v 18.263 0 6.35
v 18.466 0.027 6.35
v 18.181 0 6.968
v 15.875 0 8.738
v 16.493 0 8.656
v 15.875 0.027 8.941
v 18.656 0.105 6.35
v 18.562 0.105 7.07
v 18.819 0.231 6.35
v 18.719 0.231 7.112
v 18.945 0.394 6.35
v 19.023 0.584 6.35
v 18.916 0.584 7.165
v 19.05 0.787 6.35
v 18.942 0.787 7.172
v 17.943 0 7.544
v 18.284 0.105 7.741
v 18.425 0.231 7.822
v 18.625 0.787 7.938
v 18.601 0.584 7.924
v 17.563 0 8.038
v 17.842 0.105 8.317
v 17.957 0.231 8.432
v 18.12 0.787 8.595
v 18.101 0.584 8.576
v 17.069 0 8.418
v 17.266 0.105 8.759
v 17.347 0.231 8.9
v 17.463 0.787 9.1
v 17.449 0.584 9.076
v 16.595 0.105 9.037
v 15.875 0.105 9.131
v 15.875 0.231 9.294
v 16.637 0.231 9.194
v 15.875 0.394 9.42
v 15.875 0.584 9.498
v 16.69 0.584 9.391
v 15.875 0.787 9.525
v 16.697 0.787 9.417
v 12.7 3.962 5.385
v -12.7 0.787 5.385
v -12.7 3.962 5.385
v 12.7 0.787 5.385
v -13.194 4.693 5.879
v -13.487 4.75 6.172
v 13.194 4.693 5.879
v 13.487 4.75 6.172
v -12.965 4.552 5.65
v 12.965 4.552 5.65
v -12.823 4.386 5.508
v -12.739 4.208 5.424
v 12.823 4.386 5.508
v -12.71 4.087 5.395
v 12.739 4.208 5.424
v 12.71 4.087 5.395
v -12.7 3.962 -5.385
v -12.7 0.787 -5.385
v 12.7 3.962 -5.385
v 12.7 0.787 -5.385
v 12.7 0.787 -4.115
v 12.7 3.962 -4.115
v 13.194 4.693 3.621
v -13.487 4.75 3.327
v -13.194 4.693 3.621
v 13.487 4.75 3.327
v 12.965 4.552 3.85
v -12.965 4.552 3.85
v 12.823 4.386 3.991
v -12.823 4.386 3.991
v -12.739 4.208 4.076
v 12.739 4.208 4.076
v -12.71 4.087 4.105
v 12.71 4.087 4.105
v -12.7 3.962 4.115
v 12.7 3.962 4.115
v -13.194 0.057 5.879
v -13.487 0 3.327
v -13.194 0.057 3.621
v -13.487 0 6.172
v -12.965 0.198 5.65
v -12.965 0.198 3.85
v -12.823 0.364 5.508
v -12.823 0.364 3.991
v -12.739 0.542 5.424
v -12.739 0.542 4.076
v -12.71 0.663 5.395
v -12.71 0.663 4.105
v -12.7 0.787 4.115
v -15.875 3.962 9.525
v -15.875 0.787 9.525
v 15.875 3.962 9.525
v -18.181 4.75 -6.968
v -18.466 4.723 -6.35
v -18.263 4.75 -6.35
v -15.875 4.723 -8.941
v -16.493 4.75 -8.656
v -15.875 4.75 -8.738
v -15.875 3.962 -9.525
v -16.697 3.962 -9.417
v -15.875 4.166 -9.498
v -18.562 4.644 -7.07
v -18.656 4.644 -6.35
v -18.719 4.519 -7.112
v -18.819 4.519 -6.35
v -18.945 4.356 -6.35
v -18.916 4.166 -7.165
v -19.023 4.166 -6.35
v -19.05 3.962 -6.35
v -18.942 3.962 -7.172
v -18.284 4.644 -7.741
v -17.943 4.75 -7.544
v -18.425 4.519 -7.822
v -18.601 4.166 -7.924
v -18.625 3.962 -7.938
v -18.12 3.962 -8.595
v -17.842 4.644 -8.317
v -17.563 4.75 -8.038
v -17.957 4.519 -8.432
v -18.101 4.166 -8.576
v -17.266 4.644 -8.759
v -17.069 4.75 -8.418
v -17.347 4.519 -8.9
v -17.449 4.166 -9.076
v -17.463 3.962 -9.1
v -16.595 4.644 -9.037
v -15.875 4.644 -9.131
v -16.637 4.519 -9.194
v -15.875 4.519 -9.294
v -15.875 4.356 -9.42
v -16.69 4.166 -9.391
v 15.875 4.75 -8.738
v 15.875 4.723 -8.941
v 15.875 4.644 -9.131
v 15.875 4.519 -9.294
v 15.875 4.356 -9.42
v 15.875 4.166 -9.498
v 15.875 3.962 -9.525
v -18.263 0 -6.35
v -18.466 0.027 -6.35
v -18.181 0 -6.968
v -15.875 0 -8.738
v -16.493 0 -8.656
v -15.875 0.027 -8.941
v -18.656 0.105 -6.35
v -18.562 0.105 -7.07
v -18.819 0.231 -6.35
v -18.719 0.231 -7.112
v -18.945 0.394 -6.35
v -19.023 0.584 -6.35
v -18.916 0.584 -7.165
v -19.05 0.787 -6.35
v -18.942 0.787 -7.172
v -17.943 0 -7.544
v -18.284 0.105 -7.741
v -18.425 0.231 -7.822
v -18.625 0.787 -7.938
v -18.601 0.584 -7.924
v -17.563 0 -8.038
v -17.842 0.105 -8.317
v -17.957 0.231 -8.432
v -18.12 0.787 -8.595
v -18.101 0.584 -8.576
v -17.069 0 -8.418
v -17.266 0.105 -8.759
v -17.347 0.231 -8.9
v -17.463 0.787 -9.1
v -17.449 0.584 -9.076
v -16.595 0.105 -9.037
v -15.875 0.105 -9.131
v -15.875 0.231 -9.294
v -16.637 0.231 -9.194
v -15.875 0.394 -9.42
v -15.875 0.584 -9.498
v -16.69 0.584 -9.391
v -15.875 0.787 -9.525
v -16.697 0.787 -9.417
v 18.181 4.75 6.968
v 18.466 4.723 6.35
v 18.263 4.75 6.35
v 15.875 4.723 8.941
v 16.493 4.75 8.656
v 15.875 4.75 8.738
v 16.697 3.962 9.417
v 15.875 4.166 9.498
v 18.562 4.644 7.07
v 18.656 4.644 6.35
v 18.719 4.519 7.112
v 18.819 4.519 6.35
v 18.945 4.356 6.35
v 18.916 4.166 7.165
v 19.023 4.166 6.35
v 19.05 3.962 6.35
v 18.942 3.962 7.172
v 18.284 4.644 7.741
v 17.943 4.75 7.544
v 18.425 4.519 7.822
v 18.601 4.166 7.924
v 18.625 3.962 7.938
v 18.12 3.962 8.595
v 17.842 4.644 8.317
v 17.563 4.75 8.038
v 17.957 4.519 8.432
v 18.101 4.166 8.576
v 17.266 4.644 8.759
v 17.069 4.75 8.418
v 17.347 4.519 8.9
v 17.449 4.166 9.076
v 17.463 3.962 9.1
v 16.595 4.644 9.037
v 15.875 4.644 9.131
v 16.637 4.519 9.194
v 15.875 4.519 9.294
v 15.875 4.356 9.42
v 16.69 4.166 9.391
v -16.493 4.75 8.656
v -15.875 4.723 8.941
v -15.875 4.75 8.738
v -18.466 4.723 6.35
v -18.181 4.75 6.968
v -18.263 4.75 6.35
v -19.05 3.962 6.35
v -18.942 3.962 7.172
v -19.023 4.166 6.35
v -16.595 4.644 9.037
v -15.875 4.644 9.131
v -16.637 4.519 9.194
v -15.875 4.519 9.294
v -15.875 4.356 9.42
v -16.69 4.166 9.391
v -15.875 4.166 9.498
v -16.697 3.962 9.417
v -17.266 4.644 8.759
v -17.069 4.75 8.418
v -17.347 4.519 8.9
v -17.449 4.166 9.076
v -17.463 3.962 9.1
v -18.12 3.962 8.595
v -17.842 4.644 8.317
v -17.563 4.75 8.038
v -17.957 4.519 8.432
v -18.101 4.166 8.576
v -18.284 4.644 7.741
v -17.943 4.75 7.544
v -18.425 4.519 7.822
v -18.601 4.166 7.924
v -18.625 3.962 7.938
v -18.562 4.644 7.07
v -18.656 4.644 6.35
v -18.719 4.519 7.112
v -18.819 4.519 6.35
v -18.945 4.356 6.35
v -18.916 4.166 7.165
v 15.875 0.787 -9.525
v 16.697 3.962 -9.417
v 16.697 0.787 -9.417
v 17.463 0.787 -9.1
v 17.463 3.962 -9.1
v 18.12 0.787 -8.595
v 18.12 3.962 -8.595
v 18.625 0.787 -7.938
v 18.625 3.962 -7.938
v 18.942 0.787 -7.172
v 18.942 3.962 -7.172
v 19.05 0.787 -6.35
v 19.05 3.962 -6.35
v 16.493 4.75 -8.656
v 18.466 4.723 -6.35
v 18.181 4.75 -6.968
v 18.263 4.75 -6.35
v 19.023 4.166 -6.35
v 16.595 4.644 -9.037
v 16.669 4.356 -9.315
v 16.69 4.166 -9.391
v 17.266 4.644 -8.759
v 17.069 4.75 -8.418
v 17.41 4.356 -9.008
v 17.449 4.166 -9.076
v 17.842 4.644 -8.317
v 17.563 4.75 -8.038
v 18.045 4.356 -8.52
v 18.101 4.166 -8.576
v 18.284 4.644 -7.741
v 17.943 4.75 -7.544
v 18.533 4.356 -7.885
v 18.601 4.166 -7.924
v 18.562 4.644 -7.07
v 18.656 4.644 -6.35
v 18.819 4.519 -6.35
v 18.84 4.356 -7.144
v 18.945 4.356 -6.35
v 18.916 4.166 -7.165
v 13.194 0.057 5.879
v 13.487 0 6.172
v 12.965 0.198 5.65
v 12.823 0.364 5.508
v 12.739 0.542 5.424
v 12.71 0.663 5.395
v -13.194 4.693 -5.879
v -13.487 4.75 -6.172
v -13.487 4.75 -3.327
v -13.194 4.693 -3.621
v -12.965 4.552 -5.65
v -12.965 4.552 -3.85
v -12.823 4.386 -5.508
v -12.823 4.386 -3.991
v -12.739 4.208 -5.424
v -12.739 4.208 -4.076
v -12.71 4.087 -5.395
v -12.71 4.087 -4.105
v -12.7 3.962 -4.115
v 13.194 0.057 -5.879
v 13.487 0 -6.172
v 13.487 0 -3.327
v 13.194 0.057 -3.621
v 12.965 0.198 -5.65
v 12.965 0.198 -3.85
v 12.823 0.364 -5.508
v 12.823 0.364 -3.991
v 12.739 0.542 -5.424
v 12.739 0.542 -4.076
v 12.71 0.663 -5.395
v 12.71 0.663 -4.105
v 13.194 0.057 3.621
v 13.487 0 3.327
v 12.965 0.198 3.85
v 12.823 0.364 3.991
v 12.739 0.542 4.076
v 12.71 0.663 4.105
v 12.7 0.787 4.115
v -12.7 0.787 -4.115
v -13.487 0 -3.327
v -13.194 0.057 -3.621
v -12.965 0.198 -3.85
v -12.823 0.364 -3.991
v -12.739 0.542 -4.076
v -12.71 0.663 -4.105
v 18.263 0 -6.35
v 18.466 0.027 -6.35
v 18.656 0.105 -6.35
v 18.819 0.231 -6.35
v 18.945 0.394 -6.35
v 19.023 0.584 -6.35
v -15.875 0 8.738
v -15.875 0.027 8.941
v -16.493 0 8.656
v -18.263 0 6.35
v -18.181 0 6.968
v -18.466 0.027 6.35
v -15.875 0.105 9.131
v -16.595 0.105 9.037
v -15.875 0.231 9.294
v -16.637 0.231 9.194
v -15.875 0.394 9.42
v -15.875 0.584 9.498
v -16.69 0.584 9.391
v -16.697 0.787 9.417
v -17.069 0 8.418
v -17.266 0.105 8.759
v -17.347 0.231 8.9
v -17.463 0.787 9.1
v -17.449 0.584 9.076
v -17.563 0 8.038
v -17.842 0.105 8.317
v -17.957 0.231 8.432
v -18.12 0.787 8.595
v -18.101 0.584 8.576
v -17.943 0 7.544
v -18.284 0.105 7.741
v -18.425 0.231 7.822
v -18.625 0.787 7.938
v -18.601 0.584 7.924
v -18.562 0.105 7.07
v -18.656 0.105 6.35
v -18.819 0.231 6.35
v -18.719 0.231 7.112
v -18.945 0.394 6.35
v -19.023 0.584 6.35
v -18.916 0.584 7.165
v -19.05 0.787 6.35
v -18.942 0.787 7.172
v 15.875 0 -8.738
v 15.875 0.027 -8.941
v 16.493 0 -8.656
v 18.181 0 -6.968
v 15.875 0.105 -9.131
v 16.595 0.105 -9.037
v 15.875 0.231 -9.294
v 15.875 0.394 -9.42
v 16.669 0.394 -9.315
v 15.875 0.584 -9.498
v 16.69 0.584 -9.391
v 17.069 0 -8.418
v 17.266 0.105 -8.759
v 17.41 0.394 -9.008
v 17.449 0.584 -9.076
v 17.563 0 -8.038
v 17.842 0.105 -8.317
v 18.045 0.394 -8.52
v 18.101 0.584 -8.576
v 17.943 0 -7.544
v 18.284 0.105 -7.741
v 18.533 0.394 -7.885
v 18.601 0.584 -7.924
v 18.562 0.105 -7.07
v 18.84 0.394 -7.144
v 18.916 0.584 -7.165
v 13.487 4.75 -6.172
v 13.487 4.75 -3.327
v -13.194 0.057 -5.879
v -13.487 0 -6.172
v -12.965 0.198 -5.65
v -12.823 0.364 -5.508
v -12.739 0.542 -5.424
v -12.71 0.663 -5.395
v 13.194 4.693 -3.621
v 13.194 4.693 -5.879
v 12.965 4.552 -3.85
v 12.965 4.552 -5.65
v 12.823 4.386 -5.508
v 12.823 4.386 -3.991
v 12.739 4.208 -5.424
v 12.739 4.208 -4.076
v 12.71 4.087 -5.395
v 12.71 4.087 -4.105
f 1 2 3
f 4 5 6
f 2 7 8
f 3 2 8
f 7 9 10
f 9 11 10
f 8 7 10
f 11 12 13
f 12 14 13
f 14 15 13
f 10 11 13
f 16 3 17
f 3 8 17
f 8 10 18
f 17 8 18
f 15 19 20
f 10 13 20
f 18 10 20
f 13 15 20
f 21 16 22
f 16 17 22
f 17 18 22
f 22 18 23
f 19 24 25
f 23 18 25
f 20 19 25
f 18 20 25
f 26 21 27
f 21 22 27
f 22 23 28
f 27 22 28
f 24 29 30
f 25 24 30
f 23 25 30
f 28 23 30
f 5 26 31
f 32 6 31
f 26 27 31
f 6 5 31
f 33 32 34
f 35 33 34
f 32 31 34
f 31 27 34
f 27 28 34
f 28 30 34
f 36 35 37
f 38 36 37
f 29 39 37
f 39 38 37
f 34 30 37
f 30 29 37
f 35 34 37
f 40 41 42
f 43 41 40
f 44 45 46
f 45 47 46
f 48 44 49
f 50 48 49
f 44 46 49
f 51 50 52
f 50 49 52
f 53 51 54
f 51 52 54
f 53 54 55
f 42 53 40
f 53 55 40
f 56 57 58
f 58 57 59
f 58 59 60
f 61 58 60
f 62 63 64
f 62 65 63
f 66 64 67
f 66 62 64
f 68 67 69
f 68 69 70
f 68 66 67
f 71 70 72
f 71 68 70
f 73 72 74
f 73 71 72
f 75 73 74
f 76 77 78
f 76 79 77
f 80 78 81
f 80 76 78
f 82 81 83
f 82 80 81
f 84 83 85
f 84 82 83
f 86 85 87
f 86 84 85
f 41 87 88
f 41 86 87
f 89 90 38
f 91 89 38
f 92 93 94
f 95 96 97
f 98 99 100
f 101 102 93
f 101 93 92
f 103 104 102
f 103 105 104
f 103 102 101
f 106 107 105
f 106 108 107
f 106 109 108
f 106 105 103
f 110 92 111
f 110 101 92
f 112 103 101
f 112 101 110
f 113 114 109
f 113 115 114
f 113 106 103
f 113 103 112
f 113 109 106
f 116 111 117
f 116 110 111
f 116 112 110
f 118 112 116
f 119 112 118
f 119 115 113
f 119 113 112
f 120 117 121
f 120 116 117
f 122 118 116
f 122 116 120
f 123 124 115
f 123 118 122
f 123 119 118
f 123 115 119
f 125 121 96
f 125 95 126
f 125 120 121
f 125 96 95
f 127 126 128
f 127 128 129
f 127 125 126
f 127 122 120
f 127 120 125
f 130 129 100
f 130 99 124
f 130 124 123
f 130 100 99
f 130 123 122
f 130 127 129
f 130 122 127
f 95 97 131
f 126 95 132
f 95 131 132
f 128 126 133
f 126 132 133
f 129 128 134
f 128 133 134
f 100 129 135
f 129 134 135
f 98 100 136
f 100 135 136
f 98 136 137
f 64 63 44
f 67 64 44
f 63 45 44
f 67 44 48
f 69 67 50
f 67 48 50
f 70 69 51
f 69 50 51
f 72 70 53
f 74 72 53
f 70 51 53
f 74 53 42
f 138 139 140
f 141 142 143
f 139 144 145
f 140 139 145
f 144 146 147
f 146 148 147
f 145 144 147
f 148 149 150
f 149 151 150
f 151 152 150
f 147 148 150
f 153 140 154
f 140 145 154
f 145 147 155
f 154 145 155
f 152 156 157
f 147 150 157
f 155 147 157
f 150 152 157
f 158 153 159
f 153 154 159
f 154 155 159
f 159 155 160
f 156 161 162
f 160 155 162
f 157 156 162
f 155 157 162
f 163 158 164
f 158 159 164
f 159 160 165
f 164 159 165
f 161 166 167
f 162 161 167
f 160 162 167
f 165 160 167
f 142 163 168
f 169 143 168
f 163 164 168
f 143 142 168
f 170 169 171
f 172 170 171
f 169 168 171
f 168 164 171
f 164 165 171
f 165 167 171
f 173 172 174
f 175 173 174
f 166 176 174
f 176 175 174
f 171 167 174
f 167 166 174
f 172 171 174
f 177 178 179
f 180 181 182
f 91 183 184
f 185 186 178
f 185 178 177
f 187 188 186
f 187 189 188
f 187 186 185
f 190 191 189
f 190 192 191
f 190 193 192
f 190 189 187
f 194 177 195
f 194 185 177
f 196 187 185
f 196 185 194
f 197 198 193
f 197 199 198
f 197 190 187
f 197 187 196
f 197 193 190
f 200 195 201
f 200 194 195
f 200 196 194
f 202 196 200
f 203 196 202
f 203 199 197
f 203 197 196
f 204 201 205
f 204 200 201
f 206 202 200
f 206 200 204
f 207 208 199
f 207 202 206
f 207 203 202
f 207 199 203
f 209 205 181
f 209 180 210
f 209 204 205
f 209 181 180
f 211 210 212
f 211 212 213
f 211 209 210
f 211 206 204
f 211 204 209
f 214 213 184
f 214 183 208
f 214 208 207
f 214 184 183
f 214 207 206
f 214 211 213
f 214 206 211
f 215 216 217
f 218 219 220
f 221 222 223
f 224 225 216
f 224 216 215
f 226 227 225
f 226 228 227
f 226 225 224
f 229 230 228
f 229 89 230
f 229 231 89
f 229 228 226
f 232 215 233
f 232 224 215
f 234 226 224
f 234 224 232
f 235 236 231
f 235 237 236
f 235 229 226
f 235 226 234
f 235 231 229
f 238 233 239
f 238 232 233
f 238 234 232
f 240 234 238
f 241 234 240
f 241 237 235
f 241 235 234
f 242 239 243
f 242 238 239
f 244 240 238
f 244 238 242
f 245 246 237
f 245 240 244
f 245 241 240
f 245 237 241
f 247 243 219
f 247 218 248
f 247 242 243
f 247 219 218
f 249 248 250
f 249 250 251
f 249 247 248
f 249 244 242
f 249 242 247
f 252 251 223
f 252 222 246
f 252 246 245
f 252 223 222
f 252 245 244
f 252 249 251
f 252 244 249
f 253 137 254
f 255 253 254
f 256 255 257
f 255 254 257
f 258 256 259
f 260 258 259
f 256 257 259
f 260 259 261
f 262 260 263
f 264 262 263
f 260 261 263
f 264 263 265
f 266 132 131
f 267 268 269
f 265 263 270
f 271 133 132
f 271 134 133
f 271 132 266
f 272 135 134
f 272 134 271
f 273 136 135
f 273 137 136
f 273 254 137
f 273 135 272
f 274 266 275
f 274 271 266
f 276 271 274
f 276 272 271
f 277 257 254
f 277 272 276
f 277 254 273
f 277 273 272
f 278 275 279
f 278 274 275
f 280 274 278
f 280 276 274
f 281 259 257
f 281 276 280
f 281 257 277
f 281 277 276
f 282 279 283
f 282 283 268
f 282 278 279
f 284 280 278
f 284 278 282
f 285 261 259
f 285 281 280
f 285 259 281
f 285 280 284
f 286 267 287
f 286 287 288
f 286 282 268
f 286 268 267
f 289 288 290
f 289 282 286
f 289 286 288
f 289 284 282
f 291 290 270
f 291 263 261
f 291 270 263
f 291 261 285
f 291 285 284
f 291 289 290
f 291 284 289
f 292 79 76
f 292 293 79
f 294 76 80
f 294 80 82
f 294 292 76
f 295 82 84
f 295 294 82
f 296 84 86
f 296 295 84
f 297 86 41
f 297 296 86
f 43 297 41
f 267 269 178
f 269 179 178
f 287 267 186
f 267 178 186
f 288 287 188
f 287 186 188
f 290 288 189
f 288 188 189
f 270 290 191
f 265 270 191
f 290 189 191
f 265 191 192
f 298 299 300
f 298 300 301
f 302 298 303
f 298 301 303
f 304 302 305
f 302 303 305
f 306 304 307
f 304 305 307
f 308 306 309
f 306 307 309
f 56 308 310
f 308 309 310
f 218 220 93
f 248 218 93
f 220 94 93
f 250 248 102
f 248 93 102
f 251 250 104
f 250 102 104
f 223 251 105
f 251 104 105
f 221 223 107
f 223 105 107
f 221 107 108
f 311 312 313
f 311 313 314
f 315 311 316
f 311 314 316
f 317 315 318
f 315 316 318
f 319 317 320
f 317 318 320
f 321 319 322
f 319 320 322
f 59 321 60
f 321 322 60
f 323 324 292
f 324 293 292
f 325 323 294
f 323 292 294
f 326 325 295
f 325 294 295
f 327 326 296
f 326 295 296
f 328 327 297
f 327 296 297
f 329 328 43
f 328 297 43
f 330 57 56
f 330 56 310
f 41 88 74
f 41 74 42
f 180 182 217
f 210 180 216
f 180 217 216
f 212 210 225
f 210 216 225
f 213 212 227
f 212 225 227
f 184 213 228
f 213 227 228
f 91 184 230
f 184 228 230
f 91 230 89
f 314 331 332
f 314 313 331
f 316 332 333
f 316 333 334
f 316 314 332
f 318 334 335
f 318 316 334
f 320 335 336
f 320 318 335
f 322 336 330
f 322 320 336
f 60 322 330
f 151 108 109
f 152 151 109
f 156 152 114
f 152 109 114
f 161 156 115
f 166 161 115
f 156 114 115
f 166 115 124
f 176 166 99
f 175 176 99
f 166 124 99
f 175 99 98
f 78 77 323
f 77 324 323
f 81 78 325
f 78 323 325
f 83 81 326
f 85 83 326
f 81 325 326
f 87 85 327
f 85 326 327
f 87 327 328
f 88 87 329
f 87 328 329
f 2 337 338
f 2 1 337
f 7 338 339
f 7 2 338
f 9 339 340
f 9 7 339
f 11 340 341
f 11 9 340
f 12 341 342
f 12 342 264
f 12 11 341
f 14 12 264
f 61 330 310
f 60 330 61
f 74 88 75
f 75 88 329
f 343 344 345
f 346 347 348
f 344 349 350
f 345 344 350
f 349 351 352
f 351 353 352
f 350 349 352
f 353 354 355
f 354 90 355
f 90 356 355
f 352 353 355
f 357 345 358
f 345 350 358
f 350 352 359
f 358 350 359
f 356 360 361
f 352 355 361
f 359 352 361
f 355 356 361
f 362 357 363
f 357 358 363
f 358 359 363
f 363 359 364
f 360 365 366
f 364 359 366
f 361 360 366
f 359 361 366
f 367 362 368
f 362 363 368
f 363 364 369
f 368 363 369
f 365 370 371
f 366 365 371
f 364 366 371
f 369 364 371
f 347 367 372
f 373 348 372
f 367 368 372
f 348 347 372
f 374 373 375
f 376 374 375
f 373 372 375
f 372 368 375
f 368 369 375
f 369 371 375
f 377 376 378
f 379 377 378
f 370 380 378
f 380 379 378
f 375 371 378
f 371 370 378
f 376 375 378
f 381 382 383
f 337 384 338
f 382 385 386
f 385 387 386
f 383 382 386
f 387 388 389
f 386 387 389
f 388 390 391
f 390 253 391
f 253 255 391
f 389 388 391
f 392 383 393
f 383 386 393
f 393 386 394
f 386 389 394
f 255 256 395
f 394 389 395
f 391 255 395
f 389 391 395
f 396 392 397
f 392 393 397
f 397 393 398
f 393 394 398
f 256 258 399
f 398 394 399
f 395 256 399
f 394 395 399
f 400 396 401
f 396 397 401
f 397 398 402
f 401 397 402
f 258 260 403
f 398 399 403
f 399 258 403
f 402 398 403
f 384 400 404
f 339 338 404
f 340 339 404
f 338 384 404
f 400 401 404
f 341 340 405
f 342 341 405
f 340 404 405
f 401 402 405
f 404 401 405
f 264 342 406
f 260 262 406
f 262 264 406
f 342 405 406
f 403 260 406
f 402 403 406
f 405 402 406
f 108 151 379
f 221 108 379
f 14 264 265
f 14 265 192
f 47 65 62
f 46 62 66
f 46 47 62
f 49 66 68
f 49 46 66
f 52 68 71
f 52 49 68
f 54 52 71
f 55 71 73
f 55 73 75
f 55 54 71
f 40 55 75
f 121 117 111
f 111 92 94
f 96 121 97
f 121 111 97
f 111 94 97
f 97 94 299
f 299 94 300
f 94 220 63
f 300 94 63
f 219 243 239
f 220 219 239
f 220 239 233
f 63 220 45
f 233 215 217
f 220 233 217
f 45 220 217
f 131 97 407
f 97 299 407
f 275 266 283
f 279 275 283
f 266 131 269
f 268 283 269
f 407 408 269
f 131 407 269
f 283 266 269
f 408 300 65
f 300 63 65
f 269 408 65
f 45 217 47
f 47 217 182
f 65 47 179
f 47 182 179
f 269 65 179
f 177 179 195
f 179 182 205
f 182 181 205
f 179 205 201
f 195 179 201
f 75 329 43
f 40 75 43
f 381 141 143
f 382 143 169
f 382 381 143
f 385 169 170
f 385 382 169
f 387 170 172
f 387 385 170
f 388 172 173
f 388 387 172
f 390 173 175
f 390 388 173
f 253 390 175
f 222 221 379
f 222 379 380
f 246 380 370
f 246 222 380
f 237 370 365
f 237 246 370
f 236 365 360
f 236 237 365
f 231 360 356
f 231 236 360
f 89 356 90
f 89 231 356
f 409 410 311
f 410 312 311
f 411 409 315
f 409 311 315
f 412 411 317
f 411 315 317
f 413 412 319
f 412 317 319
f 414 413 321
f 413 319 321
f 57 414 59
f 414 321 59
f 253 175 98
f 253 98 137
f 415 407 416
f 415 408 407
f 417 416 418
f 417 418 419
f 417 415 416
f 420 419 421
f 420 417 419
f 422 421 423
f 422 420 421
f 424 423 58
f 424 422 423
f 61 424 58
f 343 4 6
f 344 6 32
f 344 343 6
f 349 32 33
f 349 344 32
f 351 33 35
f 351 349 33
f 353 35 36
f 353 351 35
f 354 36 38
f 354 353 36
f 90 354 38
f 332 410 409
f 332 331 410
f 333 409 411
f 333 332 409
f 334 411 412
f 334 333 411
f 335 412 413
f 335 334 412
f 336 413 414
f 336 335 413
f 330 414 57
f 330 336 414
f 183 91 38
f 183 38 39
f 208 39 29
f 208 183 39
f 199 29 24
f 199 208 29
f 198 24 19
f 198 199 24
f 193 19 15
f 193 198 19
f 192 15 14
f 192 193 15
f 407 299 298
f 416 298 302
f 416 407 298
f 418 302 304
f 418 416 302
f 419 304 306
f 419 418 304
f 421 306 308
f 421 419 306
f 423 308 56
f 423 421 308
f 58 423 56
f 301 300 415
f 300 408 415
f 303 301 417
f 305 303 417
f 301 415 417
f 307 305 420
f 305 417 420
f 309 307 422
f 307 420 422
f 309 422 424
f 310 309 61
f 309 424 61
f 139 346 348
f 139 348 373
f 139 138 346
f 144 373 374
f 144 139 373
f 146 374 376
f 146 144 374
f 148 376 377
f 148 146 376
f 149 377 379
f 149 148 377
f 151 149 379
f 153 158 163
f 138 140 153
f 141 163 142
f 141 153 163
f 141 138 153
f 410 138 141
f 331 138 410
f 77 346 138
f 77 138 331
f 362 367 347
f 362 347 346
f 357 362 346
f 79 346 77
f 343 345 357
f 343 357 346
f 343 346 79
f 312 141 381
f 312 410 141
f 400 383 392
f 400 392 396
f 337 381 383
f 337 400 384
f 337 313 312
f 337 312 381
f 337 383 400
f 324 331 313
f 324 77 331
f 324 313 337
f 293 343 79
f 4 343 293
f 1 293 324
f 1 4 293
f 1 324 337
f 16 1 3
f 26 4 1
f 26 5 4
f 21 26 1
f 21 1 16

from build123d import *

# Parameters (mm, degrees)
F0_W     = 38.1
F0_H     = 19.05
F0_W_2   = 25.4
F0_H_2   = 1.27
F1_DEPTH = 4.7498
F2_R     = 3.175
F3_R     = 0.7874


with BuildPart() as f1:
    # F0 (on Front) → F1 (new body)
    with BuildSketch(Plane.XZ):
        Rectangle(F0_W, F0_H)
        with Locations((0, -4.7498)):
            Rectangle(F0_W_2, F0_H_2, mode=Mode.SUBTRACT)
        with Locations((0, 4.7498)):
            Rectangle(F0_W_2, F0_H_2, mode=Mode.SUBTRACT)
    extrude(amount=-F1_DEPTH)

    # F2
    f2_edges = [f1.edges().sort_by_distance(p)[0] for p in [
        (19.05, 2.3749, 9.525),
        (19.05, 2.3749, -9.525),
        (-19.05, 2.3749, 9.525),
        (-19.05, 2.3749, -9.525),
    ]]
    fillet(f2_edges, radius=F2_R)

    # F3
    f3_edges = [f1.edges().sort_by_distance(p)[0] for p in [
        (19.05, 0, 0),
        (18.120064, 0, -8.595064),
        (18.120064, 0, 8.595064),
        (0, 0, -9.525),
        (0, 0, 9.525),
        (-18.120064, 0, -8.595064),
        (-18.120064, 0, 8.595064),
        (-19.05, 0, 0),
        (-12.7, 0, -4.7498),
        (0, 0, -4.1148),
        (12.7, 0, -4.7498),
        (0, 0, -5.3848),
        (0, 0, 4.1148),
        (-12.7, 0, 4.7498),
        (0, 0, 5.3848),
        (12.7, 0, 4.7498),
        (19.05, 4.7498, 0),
        (18.120064, 4.7498, -8.595064),
        (18.120064, 4.7498, 8.595064),
        (0, 4.7498, -9.525),
        (0, 4.7498, 9.525),
        (-18.120064, 4.7498, -8.595064),
        (-18.120064, 4.7498, 8.595064),
        (-19.05, 4.7498, 0),
        (-12.7, 4.7498, -4.7498),
        (0, 4.7498, -4.1148),
        (12.7, 4.7498, -4.7498),
        (0, 4.7498, -5.3848),
        (0, 4.7498, 4.1148),
        (-12.7, 4.7498, 4.7498),
        (0, 4.7498, 5.3848),
        (12.7, 4.7498, 4.7498),
    ]]
    fillet(f3_edges, radius=F3_R)


solid = f1.part
